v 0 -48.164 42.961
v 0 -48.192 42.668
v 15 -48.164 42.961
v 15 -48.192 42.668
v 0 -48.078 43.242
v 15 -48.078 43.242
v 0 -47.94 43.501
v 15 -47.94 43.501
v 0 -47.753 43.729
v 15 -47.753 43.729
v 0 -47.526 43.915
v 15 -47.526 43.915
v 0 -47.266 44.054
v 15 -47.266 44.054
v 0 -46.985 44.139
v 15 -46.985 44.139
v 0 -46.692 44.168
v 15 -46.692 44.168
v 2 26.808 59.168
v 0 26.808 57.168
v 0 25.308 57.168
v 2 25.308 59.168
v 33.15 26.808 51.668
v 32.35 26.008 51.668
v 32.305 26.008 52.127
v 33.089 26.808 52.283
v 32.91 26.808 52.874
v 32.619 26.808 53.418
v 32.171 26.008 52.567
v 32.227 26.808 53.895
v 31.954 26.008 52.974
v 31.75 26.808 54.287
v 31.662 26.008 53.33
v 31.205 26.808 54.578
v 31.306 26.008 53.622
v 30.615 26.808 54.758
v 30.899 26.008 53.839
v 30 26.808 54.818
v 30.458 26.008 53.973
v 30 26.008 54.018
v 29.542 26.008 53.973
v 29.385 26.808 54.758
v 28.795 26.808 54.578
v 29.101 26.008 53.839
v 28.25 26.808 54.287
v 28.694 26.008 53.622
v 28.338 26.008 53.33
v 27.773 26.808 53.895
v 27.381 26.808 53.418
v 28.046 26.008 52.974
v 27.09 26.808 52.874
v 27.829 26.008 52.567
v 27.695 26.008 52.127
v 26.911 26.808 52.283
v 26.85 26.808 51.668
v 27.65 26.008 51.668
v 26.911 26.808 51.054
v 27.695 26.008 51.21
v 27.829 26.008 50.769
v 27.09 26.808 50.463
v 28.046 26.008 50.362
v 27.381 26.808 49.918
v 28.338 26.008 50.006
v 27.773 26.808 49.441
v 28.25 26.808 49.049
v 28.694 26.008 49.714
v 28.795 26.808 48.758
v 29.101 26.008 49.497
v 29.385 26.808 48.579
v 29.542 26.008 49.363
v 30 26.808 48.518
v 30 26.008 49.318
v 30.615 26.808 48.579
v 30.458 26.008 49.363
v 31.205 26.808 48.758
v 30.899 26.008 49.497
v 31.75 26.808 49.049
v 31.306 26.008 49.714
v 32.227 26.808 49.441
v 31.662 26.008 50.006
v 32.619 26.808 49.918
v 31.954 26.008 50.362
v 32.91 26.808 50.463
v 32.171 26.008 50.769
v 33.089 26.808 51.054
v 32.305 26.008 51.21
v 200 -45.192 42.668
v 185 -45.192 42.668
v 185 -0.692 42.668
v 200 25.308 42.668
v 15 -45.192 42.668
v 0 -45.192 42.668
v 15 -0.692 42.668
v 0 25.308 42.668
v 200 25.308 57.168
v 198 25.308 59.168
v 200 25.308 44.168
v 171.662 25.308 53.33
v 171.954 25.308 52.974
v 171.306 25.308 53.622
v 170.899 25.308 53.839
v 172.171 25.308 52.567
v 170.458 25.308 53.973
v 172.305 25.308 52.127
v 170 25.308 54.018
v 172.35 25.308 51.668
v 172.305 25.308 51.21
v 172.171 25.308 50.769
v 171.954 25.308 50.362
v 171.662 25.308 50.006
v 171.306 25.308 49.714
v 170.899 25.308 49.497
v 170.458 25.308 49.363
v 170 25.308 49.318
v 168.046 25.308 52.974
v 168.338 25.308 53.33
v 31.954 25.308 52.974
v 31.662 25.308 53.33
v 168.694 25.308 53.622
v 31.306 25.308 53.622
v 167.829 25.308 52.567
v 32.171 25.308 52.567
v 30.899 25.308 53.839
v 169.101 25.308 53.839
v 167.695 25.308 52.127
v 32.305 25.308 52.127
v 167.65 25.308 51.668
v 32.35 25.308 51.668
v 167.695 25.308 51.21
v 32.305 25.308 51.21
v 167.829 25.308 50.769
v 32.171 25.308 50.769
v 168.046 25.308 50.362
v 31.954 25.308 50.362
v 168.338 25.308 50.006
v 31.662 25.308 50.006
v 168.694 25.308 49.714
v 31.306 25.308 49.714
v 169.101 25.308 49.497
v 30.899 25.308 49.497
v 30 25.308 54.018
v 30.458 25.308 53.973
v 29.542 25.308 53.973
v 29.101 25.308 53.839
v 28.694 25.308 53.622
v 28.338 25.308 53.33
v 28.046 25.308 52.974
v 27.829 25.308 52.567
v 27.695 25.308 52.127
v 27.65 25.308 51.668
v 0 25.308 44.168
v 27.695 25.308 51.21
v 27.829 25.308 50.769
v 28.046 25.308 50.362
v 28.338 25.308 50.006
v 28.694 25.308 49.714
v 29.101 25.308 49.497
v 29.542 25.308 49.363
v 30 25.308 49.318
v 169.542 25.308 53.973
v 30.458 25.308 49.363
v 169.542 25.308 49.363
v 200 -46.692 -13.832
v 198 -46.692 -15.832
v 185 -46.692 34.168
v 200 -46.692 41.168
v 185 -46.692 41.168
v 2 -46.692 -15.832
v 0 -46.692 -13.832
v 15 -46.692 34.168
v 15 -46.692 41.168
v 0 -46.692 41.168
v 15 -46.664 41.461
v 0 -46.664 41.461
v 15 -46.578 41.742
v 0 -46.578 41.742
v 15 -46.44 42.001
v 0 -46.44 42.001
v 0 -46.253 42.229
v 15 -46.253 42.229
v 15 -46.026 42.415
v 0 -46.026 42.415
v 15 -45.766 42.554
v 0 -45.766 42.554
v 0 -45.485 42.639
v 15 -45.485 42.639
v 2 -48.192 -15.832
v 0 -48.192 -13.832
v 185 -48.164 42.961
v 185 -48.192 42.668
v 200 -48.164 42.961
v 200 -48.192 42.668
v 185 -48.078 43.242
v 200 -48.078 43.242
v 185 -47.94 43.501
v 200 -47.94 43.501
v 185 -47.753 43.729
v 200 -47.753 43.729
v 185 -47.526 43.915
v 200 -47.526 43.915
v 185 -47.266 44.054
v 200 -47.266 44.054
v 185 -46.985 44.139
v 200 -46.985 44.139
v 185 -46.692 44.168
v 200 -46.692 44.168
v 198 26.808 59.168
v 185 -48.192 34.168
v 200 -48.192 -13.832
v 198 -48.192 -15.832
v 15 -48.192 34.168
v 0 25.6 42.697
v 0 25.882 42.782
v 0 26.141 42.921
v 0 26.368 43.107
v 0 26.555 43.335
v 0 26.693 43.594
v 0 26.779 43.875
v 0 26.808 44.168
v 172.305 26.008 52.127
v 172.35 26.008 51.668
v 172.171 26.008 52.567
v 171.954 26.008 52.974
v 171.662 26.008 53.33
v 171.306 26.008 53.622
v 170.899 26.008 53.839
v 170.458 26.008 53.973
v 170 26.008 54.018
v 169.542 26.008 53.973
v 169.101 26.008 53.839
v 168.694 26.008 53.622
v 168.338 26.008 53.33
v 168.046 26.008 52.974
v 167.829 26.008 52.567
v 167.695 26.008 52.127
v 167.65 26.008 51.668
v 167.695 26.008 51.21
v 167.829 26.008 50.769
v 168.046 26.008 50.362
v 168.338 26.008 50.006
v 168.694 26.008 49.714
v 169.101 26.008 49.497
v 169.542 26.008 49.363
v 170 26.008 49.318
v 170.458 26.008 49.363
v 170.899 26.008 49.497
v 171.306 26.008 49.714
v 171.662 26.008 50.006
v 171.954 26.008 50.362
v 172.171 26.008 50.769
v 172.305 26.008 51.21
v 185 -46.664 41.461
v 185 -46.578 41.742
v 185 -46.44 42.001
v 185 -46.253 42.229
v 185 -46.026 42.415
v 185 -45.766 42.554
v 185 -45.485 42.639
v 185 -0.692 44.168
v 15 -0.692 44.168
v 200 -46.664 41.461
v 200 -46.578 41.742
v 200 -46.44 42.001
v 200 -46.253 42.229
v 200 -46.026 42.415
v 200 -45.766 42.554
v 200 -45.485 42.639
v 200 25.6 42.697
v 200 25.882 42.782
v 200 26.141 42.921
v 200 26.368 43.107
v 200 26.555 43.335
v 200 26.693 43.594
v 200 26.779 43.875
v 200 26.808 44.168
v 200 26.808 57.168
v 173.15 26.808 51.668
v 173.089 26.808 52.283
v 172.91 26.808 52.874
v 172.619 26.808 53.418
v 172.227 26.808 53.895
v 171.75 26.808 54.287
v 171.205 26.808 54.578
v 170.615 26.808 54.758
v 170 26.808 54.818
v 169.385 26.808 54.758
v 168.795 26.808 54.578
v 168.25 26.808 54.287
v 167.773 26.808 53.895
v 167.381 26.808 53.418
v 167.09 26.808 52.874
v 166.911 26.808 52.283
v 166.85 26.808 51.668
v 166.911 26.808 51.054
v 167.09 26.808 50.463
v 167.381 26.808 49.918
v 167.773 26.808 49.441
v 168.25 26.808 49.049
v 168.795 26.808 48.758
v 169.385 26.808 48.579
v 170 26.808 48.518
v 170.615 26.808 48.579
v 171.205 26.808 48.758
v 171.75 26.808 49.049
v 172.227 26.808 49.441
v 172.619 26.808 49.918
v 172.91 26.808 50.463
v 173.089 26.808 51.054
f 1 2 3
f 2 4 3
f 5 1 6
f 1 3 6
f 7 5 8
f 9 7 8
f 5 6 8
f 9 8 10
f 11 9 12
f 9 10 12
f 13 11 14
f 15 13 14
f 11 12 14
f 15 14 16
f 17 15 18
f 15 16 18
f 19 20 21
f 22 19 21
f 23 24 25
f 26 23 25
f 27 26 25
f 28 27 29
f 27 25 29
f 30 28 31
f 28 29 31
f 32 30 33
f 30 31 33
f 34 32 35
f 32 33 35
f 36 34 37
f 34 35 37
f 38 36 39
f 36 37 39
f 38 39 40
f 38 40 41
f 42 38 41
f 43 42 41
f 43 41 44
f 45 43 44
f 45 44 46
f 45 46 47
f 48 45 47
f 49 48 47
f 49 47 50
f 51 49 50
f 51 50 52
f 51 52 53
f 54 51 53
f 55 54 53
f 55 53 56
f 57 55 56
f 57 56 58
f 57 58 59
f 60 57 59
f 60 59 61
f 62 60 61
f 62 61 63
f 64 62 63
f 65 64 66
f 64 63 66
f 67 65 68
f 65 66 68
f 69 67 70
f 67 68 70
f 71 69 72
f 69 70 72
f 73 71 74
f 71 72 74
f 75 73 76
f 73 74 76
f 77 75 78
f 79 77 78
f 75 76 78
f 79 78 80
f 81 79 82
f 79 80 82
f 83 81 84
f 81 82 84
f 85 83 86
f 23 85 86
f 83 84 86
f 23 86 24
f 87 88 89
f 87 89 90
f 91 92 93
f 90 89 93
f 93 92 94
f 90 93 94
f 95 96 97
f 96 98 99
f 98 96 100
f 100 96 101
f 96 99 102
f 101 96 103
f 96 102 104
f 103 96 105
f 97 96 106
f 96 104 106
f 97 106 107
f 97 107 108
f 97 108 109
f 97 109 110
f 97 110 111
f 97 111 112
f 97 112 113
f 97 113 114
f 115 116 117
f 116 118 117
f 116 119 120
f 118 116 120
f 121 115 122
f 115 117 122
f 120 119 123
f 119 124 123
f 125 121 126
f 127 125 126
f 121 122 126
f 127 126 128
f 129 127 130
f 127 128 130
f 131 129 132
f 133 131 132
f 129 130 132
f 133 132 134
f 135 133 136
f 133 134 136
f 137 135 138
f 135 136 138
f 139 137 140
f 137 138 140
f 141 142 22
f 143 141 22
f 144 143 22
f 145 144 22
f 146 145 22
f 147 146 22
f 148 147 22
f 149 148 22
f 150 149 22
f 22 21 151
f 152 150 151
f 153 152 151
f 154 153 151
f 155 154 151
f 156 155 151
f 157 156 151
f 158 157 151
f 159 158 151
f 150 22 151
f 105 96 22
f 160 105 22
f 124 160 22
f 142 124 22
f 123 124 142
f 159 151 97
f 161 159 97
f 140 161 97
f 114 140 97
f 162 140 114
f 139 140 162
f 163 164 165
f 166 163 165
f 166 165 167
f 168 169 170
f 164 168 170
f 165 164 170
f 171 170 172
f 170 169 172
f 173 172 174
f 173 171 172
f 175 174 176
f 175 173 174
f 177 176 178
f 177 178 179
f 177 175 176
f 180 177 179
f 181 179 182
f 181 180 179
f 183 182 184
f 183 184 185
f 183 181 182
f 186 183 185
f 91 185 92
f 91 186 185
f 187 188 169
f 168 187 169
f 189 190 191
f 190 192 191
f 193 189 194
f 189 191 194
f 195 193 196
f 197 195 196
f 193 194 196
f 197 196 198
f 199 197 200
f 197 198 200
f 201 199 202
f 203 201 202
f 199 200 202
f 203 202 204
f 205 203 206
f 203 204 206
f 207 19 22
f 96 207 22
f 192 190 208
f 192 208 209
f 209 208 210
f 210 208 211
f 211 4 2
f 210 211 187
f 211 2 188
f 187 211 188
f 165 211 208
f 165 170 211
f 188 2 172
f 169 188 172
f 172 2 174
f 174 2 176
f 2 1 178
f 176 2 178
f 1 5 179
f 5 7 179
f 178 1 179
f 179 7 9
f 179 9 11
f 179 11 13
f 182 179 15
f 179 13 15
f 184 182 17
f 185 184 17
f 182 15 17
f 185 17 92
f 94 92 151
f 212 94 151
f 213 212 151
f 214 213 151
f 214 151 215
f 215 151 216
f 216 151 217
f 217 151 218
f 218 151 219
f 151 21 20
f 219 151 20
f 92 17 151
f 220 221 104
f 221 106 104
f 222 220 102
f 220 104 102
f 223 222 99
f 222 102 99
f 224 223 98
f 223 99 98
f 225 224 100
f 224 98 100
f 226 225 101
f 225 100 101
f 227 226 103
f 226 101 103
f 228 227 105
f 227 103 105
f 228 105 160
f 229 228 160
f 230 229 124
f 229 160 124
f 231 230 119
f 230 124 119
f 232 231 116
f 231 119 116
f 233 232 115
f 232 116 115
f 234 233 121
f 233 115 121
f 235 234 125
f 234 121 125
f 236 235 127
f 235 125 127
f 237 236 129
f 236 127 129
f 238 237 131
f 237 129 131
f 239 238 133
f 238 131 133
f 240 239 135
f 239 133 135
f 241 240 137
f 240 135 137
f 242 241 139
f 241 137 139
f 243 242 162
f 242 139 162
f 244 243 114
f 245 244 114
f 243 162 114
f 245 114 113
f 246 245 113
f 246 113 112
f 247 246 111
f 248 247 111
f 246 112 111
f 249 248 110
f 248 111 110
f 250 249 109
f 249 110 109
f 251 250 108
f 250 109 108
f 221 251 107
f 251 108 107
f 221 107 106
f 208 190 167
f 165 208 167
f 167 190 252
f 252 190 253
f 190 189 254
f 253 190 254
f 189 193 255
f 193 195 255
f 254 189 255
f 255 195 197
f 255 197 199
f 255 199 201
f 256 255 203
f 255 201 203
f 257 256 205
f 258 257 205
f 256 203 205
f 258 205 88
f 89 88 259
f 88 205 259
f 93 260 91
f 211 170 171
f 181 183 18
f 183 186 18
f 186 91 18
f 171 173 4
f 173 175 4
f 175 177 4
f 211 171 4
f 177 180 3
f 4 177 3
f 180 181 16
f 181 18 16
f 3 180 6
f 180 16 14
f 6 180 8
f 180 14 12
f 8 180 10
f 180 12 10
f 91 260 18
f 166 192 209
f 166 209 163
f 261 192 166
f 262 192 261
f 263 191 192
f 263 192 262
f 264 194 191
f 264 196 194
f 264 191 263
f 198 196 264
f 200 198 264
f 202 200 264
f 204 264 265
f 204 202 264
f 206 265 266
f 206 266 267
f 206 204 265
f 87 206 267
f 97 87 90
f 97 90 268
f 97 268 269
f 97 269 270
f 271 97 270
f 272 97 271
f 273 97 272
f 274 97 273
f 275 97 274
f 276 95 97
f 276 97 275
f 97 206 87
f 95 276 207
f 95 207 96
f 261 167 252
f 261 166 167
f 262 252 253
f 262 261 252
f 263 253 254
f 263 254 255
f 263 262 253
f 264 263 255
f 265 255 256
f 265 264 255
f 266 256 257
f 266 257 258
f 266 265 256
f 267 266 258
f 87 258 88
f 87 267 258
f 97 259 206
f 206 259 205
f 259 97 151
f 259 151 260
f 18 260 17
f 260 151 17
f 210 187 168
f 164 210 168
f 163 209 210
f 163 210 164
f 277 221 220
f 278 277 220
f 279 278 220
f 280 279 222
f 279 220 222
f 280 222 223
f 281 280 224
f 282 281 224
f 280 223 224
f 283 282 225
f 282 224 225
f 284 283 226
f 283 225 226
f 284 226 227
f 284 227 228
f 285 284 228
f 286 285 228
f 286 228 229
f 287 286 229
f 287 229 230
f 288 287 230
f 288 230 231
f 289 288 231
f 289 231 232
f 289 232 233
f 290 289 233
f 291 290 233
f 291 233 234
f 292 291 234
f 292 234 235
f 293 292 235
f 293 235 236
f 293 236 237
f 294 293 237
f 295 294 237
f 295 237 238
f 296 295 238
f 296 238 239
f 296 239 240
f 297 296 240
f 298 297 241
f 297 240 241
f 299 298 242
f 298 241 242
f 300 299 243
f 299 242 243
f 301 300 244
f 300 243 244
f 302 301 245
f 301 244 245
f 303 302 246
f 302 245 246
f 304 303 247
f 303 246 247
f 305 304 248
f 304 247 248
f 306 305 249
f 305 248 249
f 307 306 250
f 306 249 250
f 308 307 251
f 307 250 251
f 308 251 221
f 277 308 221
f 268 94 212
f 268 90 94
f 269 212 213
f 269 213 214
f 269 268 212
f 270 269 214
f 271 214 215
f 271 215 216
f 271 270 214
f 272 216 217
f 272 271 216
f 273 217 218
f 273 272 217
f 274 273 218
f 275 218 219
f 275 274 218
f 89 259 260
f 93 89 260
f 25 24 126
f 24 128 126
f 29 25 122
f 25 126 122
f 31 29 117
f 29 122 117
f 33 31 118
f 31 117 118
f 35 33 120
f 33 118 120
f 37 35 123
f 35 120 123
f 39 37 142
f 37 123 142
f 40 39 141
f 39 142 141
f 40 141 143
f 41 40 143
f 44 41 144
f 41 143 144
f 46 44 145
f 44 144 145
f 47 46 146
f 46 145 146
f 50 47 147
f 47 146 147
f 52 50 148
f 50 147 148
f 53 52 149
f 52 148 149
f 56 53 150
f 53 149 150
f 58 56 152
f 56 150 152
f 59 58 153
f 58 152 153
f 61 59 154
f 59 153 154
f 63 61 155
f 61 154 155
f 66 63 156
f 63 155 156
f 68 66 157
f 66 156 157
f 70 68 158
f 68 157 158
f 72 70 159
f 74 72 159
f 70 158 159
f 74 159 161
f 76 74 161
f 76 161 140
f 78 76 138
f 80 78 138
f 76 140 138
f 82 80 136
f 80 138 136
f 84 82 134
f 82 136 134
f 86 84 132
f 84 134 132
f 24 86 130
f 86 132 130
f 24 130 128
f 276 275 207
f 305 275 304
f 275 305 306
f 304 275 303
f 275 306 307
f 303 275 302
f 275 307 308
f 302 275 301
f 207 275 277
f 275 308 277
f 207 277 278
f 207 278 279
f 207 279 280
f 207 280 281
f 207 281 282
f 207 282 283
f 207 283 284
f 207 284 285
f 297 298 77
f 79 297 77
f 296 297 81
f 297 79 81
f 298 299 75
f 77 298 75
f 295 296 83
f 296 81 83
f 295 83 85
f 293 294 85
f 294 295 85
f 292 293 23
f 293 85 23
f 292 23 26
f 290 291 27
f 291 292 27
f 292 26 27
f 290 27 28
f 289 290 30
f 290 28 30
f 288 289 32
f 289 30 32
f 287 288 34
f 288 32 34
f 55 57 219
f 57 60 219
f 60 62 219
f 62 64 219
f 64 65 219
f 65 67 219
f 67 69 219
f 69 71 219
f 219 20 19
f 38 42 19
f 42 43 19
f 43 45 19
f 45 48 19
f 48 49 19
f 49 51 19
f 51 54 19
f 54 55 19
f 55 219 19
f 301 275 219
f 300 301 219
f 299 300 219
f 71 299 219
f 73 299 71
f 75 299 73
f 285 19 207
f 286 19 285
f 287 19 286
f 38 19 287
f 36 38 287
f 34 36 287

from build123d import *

# Parameters (mm, degrees)
F1_DEPTH       = 200
F2_SIZE        = 2
F4_D           = 4.7
F4_CSINK_D     = 6.3
F4_CSINK_ANGLE = 90
F6_DEPTH       = 10
F7_R           = 1.5


with BuildPart() as f1:
    # F0 (on Right) → F1 (new body)
    with BuildSketch(Plane.YZ):
        Polygon((25.307591, 44.168082), (-48.192409, 44.168082), (-48.192409, -15.831918), (-46.692409, -15.831918), (-46.692409, 42.668082), (26.807591, 42.668082), (26.807591, 44.168082), (26.807591, 59.168082), (25.307591, 59.168082), align=None)
    extrude(amount=F1_DEPTH)

    # F2
    f2_edges = [f1.edges().sort_by_distance(p)[0] for p in [
        (200, 26.057591, 59.168082),
        (0, 26.057591, 59.168082),
        (0, -47.442409, -15.831918),
        (200, -47.442409, -15.831918),
    ]]
    chamfer(f2_edges, length=F2_SIZE)

    # F4 (through all)
    with Locations(Plane(origin=(0, 26.807591, 0), x_dir=(-1, 0, 0), z_dir=(0, 1, 0))):
        with Locations((-170, 51.668082), (-30, 51.668082)):
            CounterSinkHole(F4_D / 2, F4_CSINK_D / 2, counter_sink_angle=F4_CSINK_ANGLE)

    # F5 (on face) → F6 (cut)
    with BuildSketch(Plane.XY.offset(44.168082)):
        Polygon((185, -53.390387), (185, -0.692409), (15, -0.692409), (15, -52.513979), align=None)
    extrude(amount=-F6_DEPTH, mode=Mode.SUBTRACT)

    # F7
    f7_edges = [f1.edges().sort_by_distance(p)[0] for p in [
        (7.5, -48.192409, 44.168082),
        (192.5, -48.192409, 44.168082),
        (100, 26.807591, 42.668082),
        (192.5, -46.692409, 42.668082),
        (7.5, -46.692409, 42.668082),
    ]]
    fillet(f7_edges, radius=F7_R)


solid = f1.part
